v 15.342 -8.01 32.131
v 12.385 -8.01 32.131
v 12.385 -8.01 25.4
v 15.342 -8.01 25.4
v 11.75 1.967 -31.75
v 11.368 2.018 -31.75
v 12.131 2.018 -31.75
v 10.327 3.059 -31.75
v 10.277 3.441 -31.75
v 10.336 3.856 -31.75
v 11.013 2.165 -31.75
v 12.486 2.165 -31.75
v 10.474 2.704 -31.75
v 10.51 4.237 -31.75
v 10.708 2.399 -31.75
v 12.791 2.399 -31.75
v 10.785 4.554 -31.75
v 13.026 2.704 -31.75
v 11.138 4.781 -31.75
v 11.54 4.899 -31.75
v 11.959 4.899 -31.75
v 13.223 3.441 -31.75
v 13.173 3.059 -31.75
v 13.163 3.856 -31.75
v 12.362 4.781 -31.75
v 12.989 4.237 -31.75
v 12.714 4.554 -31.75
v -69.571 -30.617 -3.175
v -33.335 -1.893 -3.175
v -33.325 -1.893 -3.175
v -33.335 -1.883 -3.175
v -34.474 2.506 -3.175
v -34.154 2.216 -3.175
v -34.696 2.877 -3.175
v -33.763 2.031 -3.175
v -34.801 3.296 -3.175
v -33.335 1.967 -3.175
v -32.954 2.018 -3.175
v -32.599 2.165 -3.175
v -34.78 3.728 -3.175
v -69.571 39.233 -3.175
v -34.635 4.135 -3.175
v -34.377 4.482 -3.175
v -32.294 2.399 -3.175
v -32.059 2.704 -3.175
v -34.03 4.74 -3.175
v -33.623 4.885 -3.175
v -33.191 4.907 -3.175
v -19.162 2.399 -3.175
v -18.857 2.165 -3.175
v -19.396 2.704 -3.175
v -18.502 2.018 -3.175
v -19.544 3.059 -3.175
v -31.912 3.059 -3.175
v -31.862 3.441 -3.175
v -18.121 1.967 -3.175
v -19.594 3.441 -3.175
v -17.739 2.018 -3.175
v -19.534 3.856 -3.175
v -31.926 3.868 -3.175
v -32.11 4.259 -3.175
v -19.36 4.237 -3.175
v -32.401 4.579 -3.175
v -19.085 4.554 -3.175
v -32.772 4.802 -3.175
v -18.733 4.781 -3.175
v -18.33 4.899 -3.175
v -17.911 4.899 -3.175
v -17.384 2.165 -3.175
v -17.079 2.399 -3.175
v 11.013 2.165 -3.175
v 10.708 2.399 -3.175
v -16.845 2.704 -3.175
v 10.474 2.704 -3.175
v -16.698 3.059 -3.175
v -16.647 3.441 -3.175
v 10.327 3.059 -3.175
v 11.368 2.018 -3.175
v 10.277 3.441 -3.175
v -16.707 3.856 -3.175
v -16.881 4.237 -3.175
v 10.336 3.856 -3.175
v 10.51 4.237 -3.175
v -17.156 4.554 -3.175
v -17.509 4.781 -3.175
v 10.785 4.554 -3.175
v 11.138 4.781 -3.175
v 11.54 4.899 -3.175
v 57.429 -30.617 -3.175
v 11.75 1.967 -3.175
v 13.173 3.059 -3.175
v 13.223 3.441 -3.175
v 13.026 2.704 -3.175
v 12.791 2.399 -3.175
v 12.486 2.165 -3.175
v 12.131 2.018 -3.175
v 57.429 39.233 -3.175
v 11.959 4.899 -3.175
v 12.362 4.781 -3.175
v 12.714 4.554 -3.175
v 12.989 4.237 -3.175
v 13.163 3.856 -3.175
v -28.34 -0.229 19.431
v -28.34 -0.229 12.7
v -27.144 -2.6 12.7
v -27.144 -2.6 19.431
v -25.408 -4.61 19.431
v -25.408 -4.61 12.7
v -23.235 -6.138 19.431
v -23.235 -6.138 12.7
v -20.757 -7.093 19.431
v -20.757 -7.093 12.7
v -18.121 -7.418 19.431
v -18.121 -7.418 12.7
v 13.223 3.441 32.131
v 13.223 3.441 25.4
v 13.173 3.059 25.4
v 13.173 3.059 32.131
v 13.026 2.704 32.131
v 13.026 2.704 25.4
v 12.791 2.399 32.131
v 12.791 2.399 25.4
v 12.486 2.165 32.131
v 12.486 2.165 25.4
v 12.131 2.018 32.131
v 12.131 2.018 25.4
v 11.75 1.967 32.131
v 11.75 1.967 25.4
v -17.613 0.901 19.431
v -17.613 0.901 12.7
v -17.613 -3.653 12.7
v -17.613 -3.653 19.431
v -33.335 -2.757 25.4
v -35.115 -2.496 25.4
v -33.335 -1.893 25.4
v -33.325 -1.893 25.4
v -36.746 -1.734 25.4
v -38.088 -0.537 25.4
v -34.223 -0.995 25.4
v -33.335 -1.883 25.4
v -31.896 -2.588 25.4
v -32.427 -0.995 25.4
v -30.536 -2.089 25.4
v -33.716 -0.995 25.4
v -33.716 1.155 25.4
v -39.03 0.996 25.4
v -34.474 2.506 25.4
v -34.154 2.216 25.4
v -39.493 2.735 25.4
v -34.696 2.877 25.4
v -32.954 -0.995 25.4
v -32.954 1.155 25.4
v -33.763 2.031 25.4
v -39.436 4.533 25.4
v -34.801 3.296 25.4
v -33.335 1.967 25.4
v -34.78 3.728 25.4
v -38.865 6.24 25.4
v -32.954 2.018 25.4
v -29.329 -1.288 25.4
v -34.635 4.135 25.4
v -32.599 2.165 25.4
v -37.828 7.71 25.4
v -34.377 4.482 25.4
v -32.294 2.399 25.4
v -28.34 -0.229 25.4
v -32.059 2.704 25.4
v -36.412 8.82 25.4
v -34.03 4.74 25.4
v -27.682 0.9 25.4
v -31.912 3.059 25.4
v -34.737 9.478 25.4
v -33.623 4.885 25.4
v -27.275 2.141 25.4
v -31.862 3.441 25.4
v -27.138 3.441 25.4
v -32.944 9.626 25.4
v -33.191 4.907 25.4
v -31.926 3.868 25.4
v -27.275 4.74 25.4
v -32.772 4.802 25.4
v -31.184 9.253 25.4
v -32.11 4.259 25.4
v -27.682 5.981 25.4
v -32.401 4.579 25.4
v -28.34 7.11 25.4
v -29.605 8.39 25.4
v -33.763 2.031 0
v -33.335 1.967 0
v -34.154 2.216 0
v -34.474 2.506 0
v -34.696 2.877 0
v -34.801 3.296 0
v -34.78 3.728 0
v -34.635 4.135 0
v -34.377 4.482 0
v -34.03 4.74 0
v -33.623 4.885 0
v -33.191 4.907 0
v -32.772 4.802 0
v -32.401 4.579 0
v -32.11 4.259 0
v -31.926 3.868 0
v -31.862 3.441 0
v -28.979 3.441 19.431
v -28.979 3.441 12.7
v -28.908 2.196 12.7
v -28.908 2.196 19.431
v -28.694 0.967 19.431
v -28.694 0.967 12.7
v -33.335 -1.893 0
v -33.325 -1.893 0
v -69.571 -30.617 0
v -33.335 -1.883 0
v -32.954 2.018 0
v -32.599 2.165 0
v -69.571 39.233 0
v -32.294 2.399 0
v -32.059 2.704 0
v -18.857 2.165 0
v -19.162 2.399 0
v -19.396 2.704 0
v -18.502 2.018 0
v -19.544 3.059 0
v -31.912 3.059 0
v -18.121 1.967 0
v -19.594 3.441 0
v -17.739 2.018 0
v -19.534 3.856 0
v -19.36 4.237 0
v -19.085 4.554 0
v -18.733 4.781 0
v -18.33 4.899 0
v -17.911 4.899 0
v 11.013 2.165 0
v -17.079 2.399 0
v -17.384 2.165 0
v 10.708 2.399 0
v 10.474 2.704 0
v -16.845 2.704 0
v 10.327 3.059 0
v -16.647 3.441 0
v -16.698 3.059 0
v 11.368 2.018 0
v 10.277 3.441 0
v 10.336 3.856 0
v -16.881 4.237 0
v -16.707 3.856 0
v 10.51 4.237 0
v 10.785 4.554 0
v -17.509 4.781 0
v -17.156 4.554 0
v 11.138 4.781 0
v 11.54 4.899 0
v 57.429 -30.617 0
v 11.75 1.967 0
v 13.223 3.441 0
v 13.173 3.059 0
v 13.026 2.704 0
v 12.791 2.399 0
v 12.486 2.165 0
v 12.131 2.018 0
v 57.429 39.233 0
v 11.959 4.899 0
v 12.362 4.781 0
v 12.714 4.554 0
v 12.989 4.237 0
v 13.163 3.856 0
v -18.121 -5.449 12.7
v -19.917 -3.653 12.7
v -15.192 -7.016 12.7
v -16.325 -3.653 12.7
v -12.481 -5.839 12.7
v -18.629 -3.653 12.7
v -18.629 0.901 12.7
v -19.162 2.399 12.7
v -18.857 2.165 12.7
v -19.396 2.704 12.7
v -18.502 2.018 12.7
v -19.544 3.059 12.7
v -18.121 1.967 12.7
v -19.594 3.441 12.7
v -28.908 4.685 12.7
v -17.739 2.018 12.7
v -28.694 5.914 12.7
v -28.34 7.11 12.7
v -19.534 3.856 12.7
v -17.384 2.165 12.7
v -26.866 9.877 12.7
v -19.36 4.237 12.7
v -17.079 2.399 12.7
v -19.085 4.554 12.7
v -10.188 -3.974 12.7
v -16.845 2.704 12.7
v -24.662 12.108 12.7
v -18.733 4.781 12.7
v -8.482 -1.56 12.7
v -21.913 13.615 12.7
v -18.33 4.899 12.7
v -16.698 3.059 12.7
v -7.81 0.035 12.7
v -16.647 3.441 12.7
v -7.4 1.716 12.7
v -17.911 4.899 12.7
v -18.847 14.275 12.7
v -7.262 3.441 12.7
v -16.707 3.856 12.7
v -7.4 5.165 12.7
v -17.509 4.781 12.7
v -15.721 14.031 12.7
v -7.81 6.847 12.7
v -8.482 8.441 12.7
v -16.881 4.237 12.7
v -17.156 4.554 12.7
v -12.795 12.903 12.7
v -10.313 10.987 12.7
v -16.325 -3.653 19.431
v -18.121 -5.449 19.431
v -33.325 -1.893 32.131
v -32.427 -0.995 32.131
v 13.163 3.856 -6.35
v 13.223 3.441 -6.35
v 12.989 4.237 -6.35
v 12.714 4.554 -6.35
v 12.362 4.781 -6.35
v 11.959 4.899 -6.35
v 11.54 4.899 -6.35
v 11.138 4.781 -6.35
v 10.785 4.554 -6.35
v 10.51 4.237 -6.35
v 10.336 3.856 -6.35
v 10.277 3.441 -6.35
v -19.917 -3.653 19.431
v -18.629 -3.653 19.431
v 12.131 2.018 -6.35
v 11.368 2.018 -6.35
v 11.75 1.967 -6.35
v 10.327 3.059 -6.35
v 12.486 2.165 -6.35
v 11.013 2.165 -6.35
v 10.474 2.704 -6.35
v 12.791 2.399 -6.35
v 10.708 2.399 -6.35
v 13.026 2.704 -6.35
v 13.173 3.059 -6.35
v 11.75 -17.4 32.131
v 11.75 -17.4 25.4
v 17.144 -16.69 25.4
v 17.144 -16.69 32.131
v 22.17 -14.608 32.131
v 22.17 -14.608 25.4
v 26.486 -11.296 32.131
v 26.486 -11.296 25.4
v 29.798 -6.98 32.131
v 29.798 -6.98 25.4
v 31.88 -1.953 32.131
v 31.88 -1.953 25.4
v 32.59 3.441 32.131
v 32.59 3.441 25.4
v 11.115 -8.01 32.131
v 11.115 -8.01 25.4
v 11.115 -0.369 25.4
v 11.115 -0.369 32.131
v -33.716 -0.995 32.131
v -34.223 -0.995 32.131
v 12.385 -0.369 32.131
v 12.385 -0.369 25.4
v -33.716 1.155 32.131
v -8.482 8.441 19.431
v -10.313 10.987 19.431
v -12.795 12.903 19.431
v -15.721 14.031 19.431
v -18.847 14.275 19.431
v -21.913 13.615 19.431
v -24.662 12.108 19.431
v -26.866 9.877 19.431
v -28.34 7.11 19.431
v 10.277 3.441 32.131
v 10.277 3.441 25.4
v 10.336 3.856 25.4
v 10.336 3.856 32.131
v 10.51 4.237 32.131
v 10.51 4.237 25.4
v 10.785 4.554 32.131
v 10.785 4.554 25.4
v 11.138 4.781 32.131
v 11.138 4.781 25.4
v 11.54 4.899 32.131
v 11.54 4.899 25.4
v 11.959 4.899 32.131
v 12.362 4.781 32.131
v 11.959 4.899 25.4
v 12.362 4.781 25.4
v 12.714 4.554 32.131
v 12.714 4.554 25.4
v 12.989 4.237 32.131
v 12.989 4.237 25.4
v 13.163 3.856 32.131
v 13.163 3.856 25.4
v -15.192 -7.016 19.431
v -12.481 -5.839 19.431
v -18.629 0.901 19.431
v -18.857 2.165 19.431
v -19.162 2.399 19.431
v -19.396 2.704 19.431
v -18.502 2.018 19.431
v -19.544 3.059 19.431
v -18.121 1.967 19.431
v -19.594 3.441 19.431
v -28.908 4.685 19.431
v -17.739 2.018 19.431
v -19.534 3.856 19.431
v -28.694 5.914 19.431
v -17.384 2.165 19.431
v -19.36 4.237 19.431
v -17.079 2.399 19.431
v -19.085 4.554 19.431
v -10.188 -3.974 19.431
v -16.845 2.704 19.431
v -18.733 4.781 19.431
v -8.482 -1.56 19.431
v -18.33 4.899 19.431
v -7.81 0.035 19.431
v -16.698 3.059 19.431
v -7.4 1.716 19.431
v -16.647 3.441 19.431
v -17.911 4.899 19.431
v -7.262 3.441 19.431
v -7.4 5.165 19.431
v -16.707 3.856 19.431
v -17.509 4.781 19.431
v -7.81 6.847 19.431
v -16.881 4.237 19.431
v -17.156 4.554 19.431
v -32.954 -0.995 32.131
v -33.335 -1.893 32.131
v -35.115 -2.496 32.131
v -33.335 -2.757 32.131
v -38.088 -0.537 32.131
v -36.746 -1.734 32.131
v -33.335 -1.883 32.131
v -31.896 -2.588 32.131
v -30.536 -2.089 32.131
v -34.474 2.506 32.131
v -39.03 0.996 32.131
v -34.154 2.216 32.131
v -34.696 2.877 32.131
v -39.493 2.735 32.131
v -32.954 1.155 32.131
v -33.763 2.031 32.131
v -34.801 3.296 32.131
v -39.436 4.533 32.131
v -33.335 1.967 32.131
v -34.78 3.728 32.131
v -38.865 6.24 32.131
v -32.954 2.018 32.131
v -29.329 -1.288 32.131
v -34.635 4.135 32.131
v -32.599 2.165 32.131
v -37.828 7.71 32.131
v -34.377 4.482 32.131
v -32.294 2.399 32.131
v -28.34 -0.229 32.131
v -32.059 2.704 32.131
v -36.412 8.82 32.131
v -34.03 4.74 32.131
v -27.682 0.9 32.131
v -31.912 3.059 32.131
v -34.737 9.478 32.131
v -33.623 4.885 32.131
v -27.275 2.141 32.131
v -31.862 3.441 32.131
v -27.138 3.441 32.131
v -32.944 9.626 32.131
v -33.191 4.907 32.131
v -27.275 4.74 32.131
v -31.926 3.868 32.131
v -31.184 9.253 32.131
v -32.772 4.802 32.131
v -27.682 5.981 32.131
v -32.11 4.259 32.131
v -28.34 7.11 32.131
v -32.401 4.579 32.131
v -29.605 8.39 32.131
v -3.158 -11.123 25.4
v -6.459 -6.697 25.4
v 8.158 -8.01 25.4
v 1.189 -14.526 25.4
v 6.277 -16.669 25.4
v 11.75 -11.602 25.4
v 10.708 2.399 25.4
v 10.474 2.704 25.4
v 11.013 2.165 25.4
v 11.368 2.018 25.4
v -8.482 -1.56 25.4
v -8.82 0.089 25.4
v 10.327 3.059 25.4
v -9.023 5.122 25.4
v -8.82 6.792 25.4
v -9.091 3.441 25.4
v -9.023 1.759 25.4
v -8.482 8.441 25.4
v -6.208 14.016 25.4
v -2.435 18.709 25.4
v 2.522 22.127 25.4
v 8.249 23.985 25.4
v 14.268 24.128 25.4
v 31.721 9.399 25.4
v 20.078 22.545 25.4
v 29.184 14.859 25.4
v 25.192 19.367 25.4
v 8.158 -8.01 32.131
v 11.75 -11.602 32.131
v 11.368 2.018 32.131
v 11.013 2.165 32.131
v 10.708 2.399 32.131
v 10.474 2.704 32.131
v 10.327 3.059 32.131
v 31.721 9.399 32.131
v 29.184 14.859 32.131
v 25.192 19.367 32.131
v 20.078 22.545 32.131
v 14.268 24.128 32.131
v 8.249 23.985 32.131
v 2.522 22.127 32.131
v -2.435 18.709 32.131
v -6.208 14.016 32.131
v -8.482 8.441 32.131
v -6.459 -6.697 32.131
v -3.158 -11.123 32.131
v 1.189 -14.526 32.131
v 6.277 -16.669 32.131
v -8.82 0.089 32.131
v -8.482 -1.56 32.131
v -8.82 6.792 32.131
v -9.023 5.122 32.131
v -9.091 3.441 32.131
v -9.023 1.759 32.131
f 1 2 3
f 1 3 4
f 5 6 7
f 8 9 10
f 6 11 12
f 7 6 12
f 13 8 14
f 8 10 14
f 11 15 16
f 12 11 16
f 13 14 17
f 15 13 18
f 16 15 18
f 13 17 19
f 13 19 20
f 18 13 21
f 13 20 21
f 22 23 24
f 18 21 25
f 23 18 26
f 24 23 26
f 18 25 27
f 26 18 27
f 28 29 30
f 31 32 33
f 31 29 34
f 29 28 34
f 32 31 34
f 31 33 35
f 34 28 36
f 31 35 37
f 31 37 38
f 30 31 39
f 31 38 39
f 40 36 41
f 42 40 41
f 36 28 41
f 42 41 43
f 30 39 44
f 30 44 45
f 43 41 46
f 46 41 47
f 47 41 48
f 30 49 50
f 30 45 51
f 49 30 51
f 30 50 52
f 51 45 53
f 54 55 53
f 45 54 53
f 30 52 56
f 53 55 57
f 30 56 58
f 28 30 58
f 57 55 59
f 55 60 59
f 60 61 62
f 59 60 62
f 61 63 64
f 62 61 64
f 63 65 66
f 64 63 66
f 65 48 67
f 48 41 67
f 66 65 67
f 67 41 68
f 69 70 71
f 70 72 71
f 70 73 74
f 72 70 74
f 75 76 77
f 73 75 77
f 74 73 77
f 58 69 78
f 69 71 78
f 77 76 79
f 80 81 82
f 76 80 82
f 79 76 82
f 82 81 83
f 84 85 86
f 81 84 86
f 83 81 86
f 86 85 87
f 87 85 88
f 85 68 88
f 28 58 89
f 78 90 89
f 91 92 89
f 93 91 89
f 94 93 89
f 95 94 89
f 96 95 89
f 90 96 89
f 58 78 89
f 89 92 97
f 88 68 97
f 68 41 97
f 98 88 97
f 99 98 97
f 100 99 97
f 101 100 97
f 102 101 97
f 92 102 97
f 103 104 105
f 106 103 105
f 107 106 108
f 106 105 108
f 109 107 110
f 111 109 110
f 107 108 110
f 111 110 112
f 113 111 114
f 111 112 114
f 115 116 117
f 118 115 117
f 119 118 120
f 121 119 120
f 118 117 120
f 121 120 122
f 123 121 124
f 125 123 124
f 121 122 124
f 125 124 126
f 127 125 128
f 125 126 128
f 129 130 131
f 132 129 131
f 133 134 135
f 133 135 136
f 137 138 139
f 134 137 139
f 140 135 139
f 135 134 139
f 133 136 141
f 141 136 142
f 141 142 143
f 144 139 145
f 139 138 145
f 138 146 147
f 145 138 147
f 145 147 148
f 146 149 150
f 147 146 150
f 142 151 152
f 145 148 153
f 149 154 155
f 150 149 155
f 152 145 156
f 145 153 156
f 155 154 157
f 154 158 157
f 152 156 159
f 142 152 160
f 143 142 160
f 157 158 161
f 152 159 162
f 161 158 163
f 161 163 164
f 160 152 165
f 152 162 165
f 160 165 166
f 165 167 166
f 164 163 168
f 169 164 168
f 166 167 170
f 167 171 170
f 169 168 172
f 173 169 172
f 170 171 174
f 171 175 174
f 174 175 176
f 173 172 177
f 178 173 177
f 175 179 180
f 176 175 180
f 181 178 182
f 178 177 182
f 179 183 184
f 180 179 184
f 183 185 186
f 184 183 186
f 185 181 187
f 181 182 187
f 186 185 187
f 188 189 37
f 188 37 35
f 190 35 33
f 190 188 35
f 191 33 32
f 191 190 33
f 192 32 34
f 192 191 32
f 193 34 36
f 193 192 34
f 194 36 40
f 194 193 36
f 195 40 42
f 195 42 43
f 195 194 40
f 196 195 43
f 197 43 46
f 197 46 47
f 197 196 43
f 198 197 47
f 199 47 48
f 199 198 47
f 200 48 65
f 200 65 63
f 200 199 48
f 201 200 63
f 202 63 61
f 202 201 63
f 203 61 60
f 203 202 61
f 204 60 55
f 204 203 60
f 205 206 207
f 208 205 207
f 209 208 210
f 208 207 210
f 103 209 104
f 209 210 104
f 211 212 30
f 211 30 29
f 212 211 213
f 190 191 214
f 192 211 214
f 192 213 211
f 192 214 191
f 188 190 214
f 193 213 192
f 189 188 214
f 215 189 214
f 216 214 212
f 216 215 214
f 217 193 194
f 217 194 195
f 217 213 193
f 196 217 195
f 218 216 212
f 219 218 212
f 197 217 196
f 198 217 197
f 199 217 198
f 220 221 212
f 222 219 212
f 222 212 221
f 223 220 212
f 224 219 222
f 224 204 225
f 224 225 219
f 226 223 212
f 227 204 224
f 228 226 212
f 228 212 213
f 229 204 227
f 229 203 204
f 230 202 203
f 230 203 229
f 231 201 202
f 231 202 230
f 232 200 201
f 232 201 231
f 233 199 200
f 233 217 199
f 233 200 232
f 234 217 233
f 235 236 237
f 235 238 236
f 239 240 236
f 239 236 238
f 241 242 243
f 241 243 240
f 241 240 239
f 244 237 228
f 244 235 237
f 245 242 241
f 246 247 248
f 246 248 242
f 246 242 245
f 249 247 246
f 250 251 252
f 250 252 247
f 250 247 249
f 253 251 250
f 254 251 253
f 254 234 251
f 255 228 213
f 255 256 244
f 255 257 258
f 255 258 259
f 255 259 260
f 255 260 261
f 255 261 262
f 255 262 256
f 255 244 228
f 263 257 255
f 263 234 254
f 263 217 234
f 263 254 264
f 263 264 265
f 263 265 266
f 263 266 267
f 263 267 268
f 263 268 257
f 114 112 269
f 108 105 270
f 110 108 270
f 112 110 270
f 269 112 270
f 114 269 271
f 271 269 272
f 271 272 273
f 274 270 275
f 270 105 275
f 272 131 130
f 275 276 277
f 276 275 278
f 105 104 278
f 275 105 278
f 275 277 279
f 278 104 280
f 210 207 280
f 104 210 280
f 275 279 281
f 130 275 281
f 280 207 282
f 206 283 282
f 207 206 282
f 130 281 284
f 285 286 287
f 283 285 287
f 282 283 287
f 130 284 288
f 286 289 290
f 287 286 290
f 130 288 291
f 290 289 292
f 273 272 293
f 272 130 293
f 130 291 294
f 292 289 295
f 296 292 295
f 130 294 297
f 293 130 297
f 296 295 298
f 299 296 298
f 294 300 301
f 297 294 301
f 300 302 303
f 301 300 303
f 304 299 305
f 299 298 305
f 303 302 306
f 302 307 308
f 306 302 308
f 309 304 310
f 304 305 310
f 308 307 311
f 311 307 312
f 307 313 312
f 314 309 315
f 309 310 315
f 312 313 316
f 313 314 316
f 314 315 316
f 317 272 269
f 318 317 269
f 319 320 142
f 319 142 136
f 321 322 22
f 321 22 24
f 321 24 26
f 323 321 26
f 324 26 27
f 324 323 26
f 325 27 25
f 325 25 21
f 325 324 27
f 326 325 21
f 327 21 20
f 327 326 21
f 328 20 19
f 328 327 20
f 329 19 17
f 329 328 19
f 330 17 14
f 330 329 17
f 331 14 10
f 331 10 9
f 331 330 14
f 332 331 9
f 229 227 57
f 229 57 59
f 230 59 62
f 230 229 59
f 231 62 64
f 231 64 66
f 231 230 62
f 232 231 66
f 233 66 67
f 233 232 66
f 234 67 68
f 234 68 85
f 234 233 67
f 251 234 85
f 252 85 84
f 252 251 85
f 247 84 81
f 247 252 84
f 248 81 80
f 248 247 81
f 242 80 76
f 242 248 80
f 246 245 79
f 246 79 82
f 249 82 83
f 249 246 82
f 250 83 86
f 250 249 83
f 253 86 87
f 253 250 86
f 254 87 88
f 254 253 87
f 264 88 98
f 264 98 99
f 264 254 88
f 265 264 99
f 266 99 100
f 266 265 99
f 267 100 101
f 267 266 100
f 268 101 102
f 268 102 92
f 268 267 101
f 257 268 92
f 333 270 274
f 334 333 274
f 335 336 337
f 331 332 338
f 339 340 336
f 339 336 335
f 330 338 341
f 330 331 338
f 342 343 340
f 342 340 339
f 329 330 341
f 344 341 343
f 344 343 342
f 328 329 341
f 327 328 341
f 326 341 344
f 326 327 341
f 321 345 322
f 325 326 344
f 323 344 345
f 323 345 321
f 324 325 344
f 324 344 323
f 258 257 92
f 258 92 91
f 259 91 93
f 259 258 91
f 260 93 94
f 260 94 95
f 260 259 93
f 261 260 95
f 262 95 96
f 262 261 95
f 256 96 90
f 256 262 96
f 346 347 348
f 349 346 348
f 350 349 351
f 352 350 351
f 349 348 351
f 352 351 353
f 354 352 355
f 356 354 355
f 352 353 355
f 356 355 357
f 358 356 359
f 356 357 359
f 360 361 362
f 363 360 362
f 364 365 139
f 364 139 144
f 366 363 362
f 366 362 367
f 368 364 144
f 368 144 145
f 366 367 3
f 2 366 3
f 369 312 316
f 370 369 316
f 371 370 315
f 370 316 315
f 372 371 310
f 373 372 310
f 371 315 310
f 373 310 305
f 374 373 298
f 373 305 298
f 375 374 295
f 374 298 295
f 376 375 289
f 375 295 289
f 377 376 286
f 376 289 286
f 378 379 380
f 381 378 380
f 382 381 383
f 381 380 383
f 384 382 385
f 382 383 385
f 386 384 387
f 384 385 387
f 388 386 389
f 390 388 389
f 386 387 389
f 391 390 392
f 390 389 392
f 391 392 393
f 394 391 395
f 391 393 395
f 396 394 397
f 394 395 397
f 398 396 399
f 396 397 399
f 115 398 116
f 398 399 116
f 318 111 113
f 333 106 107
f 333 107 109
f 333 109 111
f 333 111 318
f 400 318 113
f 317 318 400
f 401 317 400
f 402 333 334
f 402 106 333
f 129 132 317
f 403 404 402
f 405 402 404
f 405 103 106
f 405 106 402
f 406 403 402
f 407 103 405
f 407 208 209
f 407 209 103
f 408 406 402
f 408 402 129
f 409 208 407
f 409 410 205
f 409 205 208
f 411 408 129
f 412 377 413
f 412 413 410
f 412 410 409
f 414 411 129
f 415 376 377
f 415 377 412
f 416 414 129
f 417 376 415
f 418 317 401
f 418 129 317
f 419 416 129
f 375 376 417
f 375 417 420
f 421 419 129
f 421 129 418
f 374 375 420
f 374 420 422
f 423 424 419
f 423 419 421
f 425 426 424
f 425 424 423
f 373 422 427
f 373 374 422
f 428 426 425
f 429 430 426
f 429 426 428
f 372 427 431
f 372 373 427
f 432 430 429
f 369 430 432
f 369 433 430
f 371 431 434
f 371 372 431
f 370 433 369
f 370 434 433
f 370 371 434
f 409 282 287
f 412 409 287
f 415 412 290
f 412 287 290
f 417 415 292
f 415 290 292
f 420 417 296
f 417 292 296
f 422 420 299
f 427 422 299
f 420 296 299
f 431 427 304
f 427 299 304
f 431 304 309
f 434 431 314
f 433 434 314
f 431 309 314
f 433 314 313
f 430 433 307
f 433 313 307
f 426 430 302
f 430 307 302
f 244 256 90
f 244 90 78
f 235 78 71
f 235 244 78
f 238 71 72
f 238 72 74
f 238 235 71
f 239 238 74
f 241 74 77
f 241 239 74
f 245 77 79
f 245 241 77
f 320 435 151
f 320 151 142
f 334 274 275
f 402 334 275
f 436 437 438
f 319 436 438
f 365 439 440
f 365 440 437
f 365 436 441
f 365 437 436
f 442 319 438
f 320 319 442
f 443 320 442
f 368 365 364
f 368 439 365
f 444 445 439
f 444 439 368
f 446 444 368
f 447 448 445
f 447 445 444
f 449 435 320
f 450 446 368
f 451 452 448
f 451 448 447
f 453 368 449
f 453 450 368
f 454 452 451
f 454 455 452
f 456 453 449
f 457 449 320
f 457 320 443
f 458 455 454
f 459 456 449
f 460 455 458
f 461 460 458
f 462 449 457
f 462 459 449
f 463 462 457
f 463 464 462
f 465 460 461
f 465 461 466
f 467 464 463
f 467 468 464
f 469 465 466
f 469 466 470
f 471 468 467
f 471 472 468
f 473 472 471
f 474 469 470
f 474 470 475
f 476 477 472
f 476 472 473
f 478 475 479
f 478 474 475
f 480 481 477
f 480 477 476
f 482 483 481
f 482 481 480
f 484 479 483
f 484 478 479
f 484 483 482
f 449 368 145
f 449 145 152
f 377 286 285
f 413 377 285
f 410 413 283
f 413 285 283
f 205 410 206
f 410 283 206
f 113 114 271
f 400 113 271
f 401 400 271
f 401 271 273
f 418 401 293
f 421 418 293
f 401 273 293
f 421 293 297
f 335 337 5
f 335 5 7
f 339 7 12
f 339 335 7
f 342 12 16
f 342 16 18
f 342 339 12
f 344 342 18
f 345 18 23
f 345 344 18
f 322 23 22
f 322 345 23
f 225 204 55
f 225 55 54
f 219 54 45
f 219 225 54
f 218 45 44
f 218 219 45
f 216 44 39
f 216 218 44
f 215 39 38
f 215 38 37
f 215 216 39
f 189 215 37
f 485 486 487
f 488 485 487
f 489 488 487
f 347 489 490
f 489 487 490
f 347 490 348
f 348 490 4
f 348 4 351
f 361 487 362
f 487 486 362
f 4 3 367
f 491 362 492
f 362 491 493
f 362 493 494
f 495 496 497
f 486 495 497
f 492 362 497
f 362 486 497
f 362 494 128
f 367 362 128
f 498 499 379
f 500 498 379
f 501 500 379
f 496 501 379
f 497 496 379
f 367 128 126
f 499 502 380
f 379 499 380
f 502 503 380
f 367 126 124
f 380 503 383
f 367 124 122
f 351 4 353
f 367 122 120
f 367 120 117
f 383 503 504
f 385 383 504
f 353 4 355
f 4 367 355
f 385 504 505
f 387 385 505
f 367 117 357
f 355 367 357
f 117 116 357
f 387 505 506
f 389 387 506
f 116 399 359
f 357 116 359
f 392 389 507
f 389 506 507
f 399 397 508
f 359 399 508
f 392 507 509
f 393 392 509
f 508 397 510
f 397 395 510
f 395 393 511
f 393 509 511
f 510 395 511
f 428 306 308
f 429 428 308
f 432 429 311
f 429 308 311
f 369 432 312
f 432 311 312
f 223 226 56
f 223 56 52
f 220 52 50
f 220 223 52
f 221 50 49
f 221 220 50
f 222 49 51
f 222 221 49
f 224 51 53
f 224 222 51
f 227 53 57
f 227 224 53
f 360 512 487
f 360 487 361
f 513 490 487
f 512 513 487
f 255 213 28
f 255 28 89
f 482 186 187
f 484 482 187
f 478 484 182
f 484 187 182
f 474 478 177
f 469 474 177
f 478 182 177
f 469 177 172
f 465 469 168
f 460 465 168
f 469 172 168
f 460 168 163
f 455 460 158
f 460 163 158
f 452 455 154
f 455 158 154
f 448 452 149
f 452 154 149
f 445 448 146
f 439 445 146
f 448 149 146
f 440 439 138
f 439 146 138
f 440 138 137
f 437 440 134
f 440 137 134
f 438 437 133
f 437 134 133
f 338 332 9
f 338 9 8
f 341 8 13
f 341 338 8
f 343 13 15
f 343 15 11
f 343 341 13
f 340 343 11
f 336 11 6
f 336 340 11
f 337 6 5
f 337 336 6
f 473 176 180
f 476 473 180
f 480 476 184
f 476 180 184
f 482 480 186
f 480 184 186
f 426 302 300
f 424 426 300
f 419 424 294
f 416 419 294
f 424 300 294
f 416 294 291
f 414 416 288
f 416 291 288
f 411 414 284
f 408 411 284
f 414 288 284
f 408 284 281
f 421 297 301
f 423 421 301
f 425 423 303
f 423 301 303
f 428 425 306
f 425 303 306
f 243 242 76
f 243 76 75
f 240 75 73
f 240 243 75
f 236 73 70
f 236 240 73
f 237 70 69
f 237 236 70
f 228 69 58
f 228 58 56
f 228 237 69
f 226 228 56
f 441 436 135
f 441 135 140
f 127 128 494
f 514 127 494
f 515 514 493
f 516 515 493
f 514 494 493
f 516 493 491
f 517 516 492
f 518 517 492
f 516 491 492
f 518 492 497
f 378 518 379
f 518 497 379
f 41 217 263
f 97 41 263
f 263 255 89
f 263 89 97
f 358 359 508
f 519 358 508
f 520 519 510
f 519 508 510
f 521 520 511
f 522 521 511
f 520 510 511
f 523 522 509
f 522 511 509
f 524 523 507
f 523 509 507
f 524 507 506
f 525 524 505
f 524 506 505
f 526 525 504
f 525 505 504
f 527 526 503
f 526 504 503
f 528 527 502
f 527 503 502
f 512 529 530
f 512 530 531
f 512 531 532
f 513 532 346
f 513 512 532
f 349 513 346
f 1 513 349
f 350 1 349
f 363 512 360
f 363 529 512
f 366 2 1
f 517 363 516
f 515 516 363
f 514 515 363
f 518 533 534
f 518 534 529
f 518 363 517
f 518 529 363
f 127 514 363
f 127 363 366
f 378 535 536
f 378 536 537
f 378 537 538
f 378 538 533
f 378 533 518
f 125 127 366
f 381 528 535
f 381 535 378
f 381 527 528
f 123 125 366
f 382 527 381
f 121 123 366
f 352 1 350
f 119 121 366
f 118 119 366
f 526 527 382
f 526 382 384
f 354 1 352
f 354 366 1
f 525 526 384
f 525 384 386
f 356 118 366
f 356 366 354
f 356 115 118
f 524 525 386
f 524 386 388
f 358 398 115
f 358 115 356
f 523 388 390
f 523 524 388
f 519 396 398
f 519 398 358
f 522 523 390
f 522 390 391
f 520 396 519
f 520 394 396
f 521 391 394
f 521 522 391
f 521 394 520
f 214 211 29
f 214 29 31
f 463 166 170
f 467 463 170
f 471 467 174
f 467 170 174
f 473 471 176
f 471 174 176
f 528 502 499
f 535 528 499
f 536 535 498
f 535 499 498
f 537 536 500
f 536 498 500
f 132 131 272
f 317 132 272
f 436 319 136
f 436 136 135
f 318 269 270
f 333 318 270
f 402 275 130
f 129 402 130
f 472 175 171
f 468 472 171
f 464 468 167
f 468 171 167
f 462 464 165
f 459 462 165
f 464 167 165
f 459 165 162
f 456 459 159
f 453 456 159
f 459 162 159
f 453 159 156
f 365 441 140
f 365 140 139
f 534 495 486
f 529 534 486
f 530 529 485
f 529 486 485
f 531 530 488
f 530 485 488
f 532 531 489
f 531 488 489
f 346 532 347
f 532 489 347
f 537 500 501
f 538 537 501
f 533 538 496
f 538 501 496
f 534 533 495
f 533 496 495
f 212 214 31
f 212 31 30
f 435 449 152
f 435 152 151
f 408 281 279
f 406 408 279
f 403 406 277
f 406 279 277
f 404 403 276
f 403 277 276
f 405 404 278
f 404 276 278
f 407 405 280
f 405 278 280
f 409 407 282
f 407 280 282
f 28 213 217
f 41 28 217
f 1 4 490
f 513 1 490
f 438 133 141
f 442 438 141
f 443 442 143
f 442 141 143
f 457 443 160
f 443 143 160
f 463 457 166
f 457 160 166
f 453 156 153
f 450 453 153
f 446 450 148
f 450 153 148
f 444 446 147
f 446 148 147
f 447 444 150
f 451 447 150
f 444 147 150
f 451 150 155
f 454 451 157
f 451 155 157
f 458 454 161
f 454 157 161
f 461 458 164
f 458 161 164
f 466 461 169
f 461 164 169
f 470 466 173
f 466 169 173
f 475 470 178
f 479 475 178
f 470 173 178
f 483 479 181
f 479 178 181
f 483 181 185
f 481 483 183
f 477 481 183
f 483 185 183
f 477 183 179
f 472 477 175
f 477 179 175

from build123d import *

# Parameters (mm, degrees)
F0_W     = 127
F0_H     = 69.85
F0_W_2   = 0.381
F0_H_2   = 2.1499743879
F0_W_3   = 0.508
F0_H_3   = 4.5539487758
F0_W_4   = 0.635
F0_H_4   = 7.6400852611
F1_DEPTH = 3.175
F2_START = 25.4
F2_DEPTH = 6.731
F3_START = 25.4
F3_DEPTH = 6.731
F4_START = 12.7
F4_DEPTH = 6.731
F5_START = -6.35
F5_DEPTH = 25.4


with BuildPart() as f1:
    # F0 (on Top) → F1 (new body)
    with BuildSketch(Plane.XY):
        with Locations((-6.0705711842, 4.3084023254)):
            Rectangle(F0_W, F0_H)
        with BuildLine():
            ThreePointArc((-33.3352696088, -2.7570773477), (-38.8647330515, 6.2396796318), (-28.3404857607, 7.1096342711))
            ThreePointArc((-28.3404857607, 7.1096342711), (-18.8470887176, 14.2746971722), (-8.4821471598, 8.4411133425))
            ThreePointArc((-8.4821471598, 8.4411133425), (14.2684886182, 24.1284571428), (32.5904303912, 3.4405226523))
            ThreePointArc((32.5904303912, 3.4405226523), (26.4863306859, -11.2960776424), (11.7497303912, -17.4001773477))
            ThreePointArc((11.7497303912, -17.4001773477), (-1.0978173533, -12.9690871372), (-8.4821471598, -1.5600680379))
            ThreePointArc((-8.4821471598, -1.5600680379), (-12.4811612862, -5.8386458519), (-18.1206696088, -7.4179773477))
            ThreePointArc((-18.1206696088, -7.4179773477), (-24.3683081122, -5.4405828747), (-28.3404857607, -0.2285889665))
            ThreePointArc((-28.3404857607, -0.2285889665), (-30.5361126293, -2.0889407904), (-33.3352696088, -2.7570773477))
        make_face(mode=Mode.SUBTRACT)
        with BuildLine():
            Line((10.2765303912, 3.4405226523), (-7.2621696088, 3.4405226523))
            ThreePointArc((-7.2621696088, 3.4405226523), (-7.5715720582, 0.8668942566), (-8.4821471598, -1.5600680379))
            ThreePointArc((-8.4821471598, -1.5600680379), (-1.0978173533, -12.9690871372), (11.7497303912, -17.4001773477))
            Line((11.7497303912, -17.4001773477), (11.7497303912, -11.6016650572))
            Line((11.7497303912, -11.6016650572), (11.1147303912, -11.6016650572))
            Line((11.1147303912, -11.6016650572), (11.1147303912, -10.9666650572))
            Line((11.1147303912, -10.9666650572), (8.1576279428, -8.0095626088))
            Line((8.1576279428, -8.0095626088), (11.1147303912, -8.0095626088))
            Line((11.1147303912, -8.0095626088), (11.1147303912, -0.3694773477))
            Line((11.1147303912, -0.3694773477), (11.7497303912, -0.3694773477))
            Line((11.7497303912, -0.3694773477), (11.7497303912, 1.9673226523))
            ThreePointArc((11.7497303912, 1.9673226523), (10.7080206812, 2.3988129423), (10.2765303912, 3.4405226523))
        make_face()
        with BuildLine():
            ThreePointArc((32.5904303912, 3.4405226523), (14.2684886182, 24.1284571428), (-8.4821471598, 8.4411133425))
            ThreePointArc((-8.4821471598, 8.4411133425), (-7.5715720582, 6.0141510479), (-7.2621696088, 3.4405226523))
            Line((-7.2621696088, 3.4405226523), (10.2765303912, 3.4405226523))
            ThreePointArc((10.2765303912, 3.4405226523), (11.7497303912, 4.9137226523), (13.2229303912, 3.4405226523))
            ThreePointArc((13.2229303912, 3.4405226523), (12.7914401012, 2.3988129423), (11.7497303912, 1.9673226523))
            Line((11.7497303912, 1.9673226523), (11.7497303912, -0.3694773477))
            Line((11.7497303912, -0.3694773477), (12.3847303912, -0.3694773477))
            Line((12.3847303912, -0.3694773477), (12.3847303912, -8.0095626088))
            Line((12.3847303912, -8.0095626088), (15.3418328396, -8.0095626088))
            Line((15.3418328396, -8.0095626088), (12.3847303912, -10.9666650572))
            Line((12.3847303912, -10.9666650572), (12.3847303912, -11.6016650572))
            Line((12.3847303912, -11.6016650572), (11.7497303912, -11.6016650572))
            Line((11.7497303912, -11.6016650572), (11.7497303912, -17.4001773477))
            ThreePointArc((11.7497303912, -17.4001773477), (26.4863306859, -11.2960776424), (32.5904303912, 3.4405226523))
        make_face()
        with BuildLine():
            ThreePointArc((-28.3404857607, 7.1096342711), (-27.4460456303, 5.3711408672), (-27.1376696088, 3.4405226523))
            Line((-27.1376696088, 3.4405226523), (-19.5938696088, 3.4405226523))
            ThreePointArc((-19.5938696088, 3.4405226523), (-18.1206696088, 4.9137226523), (-16.6474696088, 3.4405226523))
            Line((-16.6474696088, 3.4405226523), (-9.0909696088, 3.4405226523))
            ThreePointArc((-9.0909696088, 3.4405226523), (-8.9382040993, 5.9592808793), (-8.4821471598, 8.4411133425))
            ThreePointArc((-8.4821471598, 8.4411133425), (-18.8470887176, 14.2746971722), (-28.3404857607, 7.1096342711))
        make_face()
        with BuildLine():
            ThreePointArc((-33.3352696088, 1.9673226523), (-34.3769793188, 4.4822323623), (-31.8620696088, 3.4405226523))
            Line((-31.8620696088, 3.4405226523), (-28.9791696088, 3.4405226523))
            ThreePointArc((-28.9791696088, 3.4405226523), (-28.8183071035, 5.3026650427), (-28.3404857607, 7.1096342711))
            ThreePointArc((-28.3404857607, 7.1096342711), (-38.8647330515, 6.2396796318), (-33.3352696088, -2.7570773477))
            Line((-33.3352696088, -2.7570773477), (-33.3352696088, -1.8934773477))
            Line((-33.3352696088, -1.8934773477), (-33.3352696088, -1.8828803738))
            Line((-33.3352696088, -1.8828803738), (-34.222698247, -0.9954517356))
            Line((-34.222698247, -0.9954517356), (-33.7162696088, -0.9954517356))
            Line((-33.7162696088, -0.9954517356), (-33.7162696088, 1.1545226523))
            Line((-33.7162696088, 1.1545226523), (-33.3352696088, 1.1545226523))
            Line((-33.3352696088, 1.1545226523), (-33.3352696088, 1.9673226523))
        make_face()
        with BuildLine():
            Line((-28.9791696088, 3.4405226523), (-31.8620696088, 3.4405226523))
            ThreePointArc((-31.8620696088, 3.4405226523), (-32.2935598988, 2.3988129423), (-33.3352696088, 1.9673226523))
            Line((-33.3352696088, 1.9673226523), (-33.3352696088, 1.1545226523))
            Line((-33.3352696088, 1.1545226523), (-32.9542696088, 1.1545226523))
            Line((-32.9542696088, 1.1545226523), (-32.9542696088, -0.9954517356))
            Line((-32.9542696088, -0.9954517356), (-32.4266470228, -0.9954517356))
            Line((-32.4266470228, -0.9954517356), (-32.9542696088, -1.5230743216))
            Line((-32.9542696088, -1.5230743216), (-32.9542696088, -1.8934773477))
            Line((-32.9542696088, -1.8934773477), (-33.3246726349, -1.8934773477))
            Line((-33.3246726349, -1.8934773477), (-33.3352696088, -1.8934773477))
            Line((-33.3352696088, -1.8934773477), (-33.3352696088, -2.7570773477))
            ThreePointArc((-33.3352696088, -2.7570773477), (-30.5361126293, -2.0889407904), (-28.3404857607, -0.2285889665))
            ThreePointArc((-28.3404857607, -0.2285889665), (-28.8183071035, 1.5783802619), (-28.9791696088, 3.4405226523))
        make_face()
        with BuildLine():
            Line((-27.1376696088, 3.4405226523), (-28.9791696088, 3.4405226523))
            ThreePointArc((-28.9791696088, 3.4405226523), (-28.8183071035, 1.5783802619), (-28.3404857607, -0.2285889665))
            ThreePointArc((-28.3404857607, -0.2285889665), (-27.4460456303, 1.5099044374), (-27.1376696088, 3.4405226523))
        make_face()
        with BuildLine():
            ThreePointArc((-28.3404857607, 7.1096342711), (-28.8183071035, 5.3026650427), (-28.9791696088, 3.4405226523))
            Line((-28.9791696088, 3.4405226523), (-27.1376696088, 3.4405226523))
            ThreePointArc((-27.1376696088, 3.4405226523), (-27.4460456303, 5.3711408672), (-28.3404857607, 7.1096342711))
        make_face()
        with BuildLine():
            Line((-7.2621696088, 3.4405226523), (-9.0909696088, 3.4405226523))
            ThreePointArc((-9.0909696088, 3.4405226523), (-8.9382040993, 0.9217644253), (-8.4821471598, -1.5600680379))
            ThreePointArc((-8.4821471598, -1.5600680379), (-7.5715720582, 0.8668942566), (-7.2621696088, 3.4405226523))
        make_face()
        with BuildLine():
            ThreePointArc((-7.2621696088, 3.4405226523), (-7.5715720582, 6.0141510479), (-8.4821471598, 8.4411133425))
            ThreePointArc((-8.4821471598, 8.4411133425), (-8.9382040993, 5.9592808793), (-9.0909696088, 3.4405226523))
            Line((-9.0909696088, 3.4405226523), (-7.2621696088, 3.4405226523))
        make_face()
        with Locations((-33.5257696088, 0.0795354583)):
            Rectangle(F0_W_2, F0_H_2)
        Polygon((-33.3352696088, -1.8828803738), (-33.3352696088, -0.9954517356), (-33.7162696088, -0.9954517356), (-34.222698247, -0.9954517356), align=None)
        with Locations((-33.1447696088, 0.0795354583)):
            Rectangle(F0_W_2, F0_H_2)
        Polygon((-32.9542696088, -0.9954517356), (-33.3352696088, -0.9954517356), (-33.3352696088, -1.8828803738), (-33.3246726349, -1.8934773477), (-32.9542696088, -1.5230743216), align=None)
        Polygon((-32.4266470228, -0.9954517356), (-32.9542696088, -0.9954517356), (-32.9542696088, -1.5230743216), align=None)
        Polygon((-32.9542696088, -1.5230743216), (-33.3246726349, -1.8934773477), (-32.9542696088, -1.8934773477), align=None)
        with BuildLine():
            Line((-18.1206696088, -5.4494773477), (-18.1206696088, -7.4179773477))
            ThreePointArc((-18.1206696088, -7.4179773477), (-12.4811612862, -5.8386458519), (-8.4821471598, -1.5600680379))
            ThreePointArc((-8.4821471598, -1.5600680379), (-8.9382040993, 0.9217644253), (-9.0909696088, 3.4405226523))
            Line((-9.0909696088, 3.4405226523), (-16.6474696088, 3.4405226523))
            ThreePointArc((-16.6474696088, 3.4405226523), (-17.0789598988, 2.3988129423), (-18.1206696088, 1.9673226523))
            Line((-18.1206696088, 1.9673226523), (-18.1206696088, 0.9005226523))
            Line((-18.1206696088, 0.9005226523), (-17.6126696088, 0.9005226523))
            Line((-17.6126696088, 0.9005226523), (-17.6126696088, -3.6534261235))
            Line((-17.6126696088, -3.6534261235), (-16.3246183846, -3.6534261235))
            Line((-16.3246183846, -3.6534261235), (-17.6126696088, -4.9414773477))
            Line((-17.6126696088, -4.9414773477), (-17.6126696088, -5.4494773477))
            Line((-17.6126696088, -5.4494773477), (-18.1206696088, -5.4494773477))
        make_face()
        with Locations((-18.3746696088, -1.3764517356)):
            Rectangle(F0_W_3, F0_H_3)
        with Locations((-17.8666696088, -1.3764517356)):
            Rectangle(F0_W_3, F0_H_3)
        Polygon((-19.916720833, -3.6534261235), (-18.6286696088, -4.9414773477), (-18.6286696088, -3.6534261235), align=None)
        Polygon((-18.6286696088, -4.9414773477), (-18.1206696088, -5.4494773477), (-18.1206696088, -3.6534261235), (-18.6286696088, -3.6534261235), align=None)
        Polygon((-18.1206696088, -3.6534261235), (-18.1206696088, -5.4494773477), (-17.6126696088, -4.9414773477), (-17.6126696088, -3.6534261235), align=None)
        Polygon((-17.6126696088, -3.6534261235), (-17.6126696088, -4.9414773477), (-16.3246183846, -3.6534261235), align=None)
        Polygon((-17.6126696088, -4.9414773477), (-18.1206696088, -5.4494773477), (-17.6126696088, -5.4494773477), align=None)
        Polygon((-18.6286696088, -5.4494773477), (-18.1206696088, -5.4494773477), (-18.6286696088, -4.9414773477), align=None)
        with BuildLine():
            Line((-19.5938696088, 3.4405226523), (-27.1376696088, 3.4405226523))
            ThreePointArc((-27.1376696088, 3.4405226523), (-27.4460456303, 1.5099044374), (-28.3404857607, -0.2285889665))
            ThreePointArc((-28.3404857607, -0.2285889665), (-24.3683081122, -5.4405828747), (-18.1206696088, -7.4179773477))
            Line((-18.1206696088, -7.4179773477), (-18.1206696088, -5.4494773477))
            Line((-18.1206696088, -5.4494773477), (-18.6286696088, -5.4494773477))
            Line((-18.6286696088, -5.4494773477), (-18.6286696088, -4.9414773477))
            Line((-18.6286696088, -4.9414773477), (-19.916720833, -3.6534261235))
            Line((-19.916720833, -3.6534261235), (-18.6286696088, -3.6534261235))
            Line((-18.6286696088, -3.6534261235), (-18.6286696088, 0.9005226523))
            Line((-18.6286696088, 0.9005226523), (-18.1206696088, 0.9005226523))
            Line((-18.1206696088, 0.9005226523), (-18.1206696088, 1.9673226523))
            ThreePointArc((-18.1206696088, 1.9673226523), (-19.1623793188, 2.3988129423), (-19.5938696088, 3.4405226523))
        make_face()
        Polygon((11.7497303912, -8.0095626088), (11.7497303912, -11.6016650572), (12.3847303912, -10.9666650572), (12.3847303912, -8.0095626088), align=None)
        Polygon((12.3847303912, -8.0095626088), (12.3847303912, -10.9666650572), (15.3418328396, -8.0095626088), align=None)
        Polygon((11.1147303912, -10.9666650572), (11.7497303912, -11.6016650572), (11.7497303912, -8.0095626088), (11.1147303912, -8.0095626088), align=None)
        Polygon((8.1576279428, -8.0095626088), (11.1147303912, -10.9666650572), (11.1147303912, -8.0095626088), align=None)
        with Locations((12.0672303912, -4.1895199783)):
            Rectangle(F0_W_4, F0_H_4)
        with Locations((11.4322303912, -4.1895199783)):
            Rectangle(F0_W_4, F0_H_4)
        Polygon((12.3847303912, -10.9666650572), (11.7497303912, -11.6016650572), (12.3847303912, -11.6016650572), align=None)
        Polygon((11.1147303912, -11.6016650572), (11.7497303912, -11.6016650572), (11.1147303912, -10.9666650572), align=None)
    extrude(amount=-F1_DEPTH)


with BuildPart() as f2:
    # F0 (on Top) → F2 (new body)
    with BuildSketch(Plane.XY.offset(F2_START)):
        with BuildLine():
            Line((10.2765303912, 3.4405226523), (-7.2621696088, 3.4405226523))
            ThreePointArc((-7.2621696088, 3.4405226523), (-7.5715720582, 0.8668942566), (-8.4821471598, -1.5600680379))
            ThreePointArc((-8.4821471598, -1.5600680379), (-1.0978173533, -12.9690871372), (11.7497303912, -17.4001773477))
            Line((11.7497303912, -17.4001773477), (11.7497303912, -11.6016650572))
            Line((11.7497303912, -11.6016650572), (11.1147303912, -11.6016650572))
            Line((11.1147303912, -11.6016650572), (11.1147303912, -10.9666650572))
            Line((11.1147303912, -10.9666650572), (8.1576279428, -8.0095626088))
            Line((8.1576279428, -8.0095626088), (11.1147303912, -8.0095626088))
            Line((11.1147303912, -8.0095626088), (11.1147303912, -0.3694773477))
            Line((11.1147303912, -0.3694773477), (11.7497303912, -0.3694773477))
            Line((11.7497303912, -0.3694773477), (11.7497303912, 1.9673226523))
            ThreePointArc((11.7497303912, 1.9673226523), (10.7080206812, 2.3988129423), (10.2765303912, 3.4405226523))
        make_face()
        with BuildLine():
            Line((-7.2621696088, 3.4405226523), (-9.0909696088, 3.4405226523))
            ThreePointArc((-9.0909696088, 3.4405226523), (-8.9382040993, 0.9217644253), (-8.4821471598, -1.5600680379))
            ThreePointArc((-8.4821471598, -1.5600680379), (-7.5715720582, 0.8668942566), (-7.2621696088, 3.4405226523))
        make_face()
        with BuildLine():
            ThreePointArc((-7.2621696088, 3.4405226523), (-7.5715720582, 6.0141510479), (-8.4821471598, 8.4411133425))
            ThreePointArc((-8.4821471598, 8.4411133425), (-8.9382040993, 5.9592808793), (-9.0909696088, 3.4405226523))
            Line((-9.0909696088, 3.4405226523), (-7.2621696088, 3.4405226523))
        make_face()
        Polygon((12.3847303912, -10.9666650572), (11.7497303912, -11.6016650572), (12.3847303912, -11.6016650572), align=None)
        Polygon((11.1147303912, -11.6016650572), (11.7497303912, -11.6016650572), (11.1147303912, -10.9666650572), align=None)
        with BuildLine():
            ThreePointArc((32.5904303912, 3.4405226523), (14.2684886182, 24.1284571428), (-8.4821471598, 8.4411133425))
            ThreePointArc((-8.4821471598, 8.4411133425), (-7.5715720582, 6.0141510479), (-7.2621696088, 3.4405226523))
            Line((-7.2621696088, 3.4405226523), (10.2765303912, 3.4405226523))
            ThreePointArc((10.2765303912, 3.4405226523), (11.7497303912, 4.9137226523), (13.2229303912, 3.4405226523))
            ThreePointArc((13.2229303912, 3.4405226523), (12.7914401012, 2.3988129423), (11.7497303912, 1.9673226523))
            Line((11.7497303912, 1.9673226523), (11.7497303912, -0.3694773477))
            Line((11.7497303912, -0.3694773477), (12.3847303912, -0.3694773477))
            Line((12.3847303912, -0.3694773477), (12.3847303912, -8.0095626088))
            Line((12.3847303912, -8.0095626088), (15.3418328396, -8.0095626088))
            Line((15.3418328396, -8.0095626088), (12.3847303912, -10.9666650572))
            Line((12.3847303912, -10.9666650572), (12.3847303912, -11.6016650572))
            Line((12.3847303912, -11.6016650572), (11.7497303912, -11.6016650572))
            Line((11.7497303912, -11.6016650572), (11.7497303912, -17.4001773477))
            ThreePointArc((11.7497303912, -17.4001773477), (26.4863306859, -11.2960776424), (32.5904303912, 3.4405226523))
        make_face()
    extrude(amount=F2_DEPTH)


with BuildPart() as f3:
    # F0 (on Top) → F3 (new body)
    with BuildSketch(Plane.XY.offset(F3_START)):
        with BuildLine():
            ThreePointArc((-28.3404857607, 7.1096342711), (-28.8183071035, 5.3026650427), (-28.9791696088, 3.4405226523))
            Line((-28.9791696088, 3.4405226523), (-27.1376696088, 3.4405226523))
            ThreePointArc((-27.1376696088, 3.4405226523), (-27.4460456303, 5.3711408672), (-28.3404857607, 7.1096342711))
        make_face()
        with BuildLine():
            Line((-27.1376696088, 3.4405226523), (-28.9791696088, 3.4405226523))
            ThreePointArc((-28.9791696088, 3.4405226523), (-28.8183071035, 1.5783802619), (-28.3404857607, -0.2285889665))
            ThreePointArc((-28.3404857607, -0.2285889665), (-27.4460456303, 1.5099044374), (-27.1376696088, 3.4405226523))
        make_face()
        with BuildLine():
            ThreePointArc((-33.3352696088, 1.9673226523), (-34.3769793188, 4.4822323623), (-31.8620696088, 3.4405226523))
            Line((-31.8620696088, 3.4405226523), (-28.9791696088, 3.4405226523))
            ThreePointArc((-28.9791696088, 3.4405226523), (-28.8183071035, 5.3026650427), (-28.3404857607, 7.1096342711))
            ThreePointArc((-28.3404857607, 7.1096342711), (-38.8647330515, 6.2396796318), (-33.3352696088, -2.7570773477))
            Line((-33.3352696088, -2.7570773477), (-33.3352696088, -1.8934773477))
            Line((-33.3352696088, -1.8934773477), (-33.3352696088, -1.8828803738))
            Line((-33.3352696088, -1.8828803738), (-34.222698247, -0.9954517356))
            Line((-34.222698247, -0.9954517356), (-33.7162696088, -0.9954517356))
            Line((-33.7162696088, -0.9954517356), (-33.7162696088, 1.1545226523))
            Line((-33.7162696088, 1.1545226523), (-33.3352696088, 1.1545226523))
            Line((-33.3352696088, 1.1545226523), (-33.3352696088, 1.9673226523))
        make_face()
        Polygon((-32.9542696088, -1.5230743216), (-33.3246726349, -1.8934773477), (-32.9542696088, -1.8934773477), align=None)
        with BuildLine():
            Line((-28.9791696088, 3.4405226523), (-31.8620696088, 3.4405226523))
            ThreePointArc((-31.8620696088, 3.4405226523), (-32.2935598988, 2.3988129423), (-33.3352696088, 1.9673226523))
            Line((-33.3352696088, 1.9673226523), (-33.3352696088, 1.1545226523))
            Line((-33.3352696088, 1.1545226523), (-32.9542696088, 1.1545226523))
            Line((-32.9542696088, 1.1545226523), (-32.9542696088, -0.9954517356))
            Line((-32.9542696088, -0.9954517356), (-32.4266470228, -0.9954517356))
            Line((-32.4266470228, -0.9954517356), (-32.9542696088, -1.5230743216))
            Line((-32.9542696088, -1.5230743216), (-32.9542696088, -1.8934773477))
            Line((-32.9542696088, -1.8934773477), (-33.3246726349, -1.8934773477))
            Line((-33.3246726349, -1.8934773477), (-33.3352696088, -1.8934773477))
            Line((-33.3352696088, -1.8934773477), (-33.3352696088, -2.7570773477))
            ThreePointArc((-33.3352696088, -2.7570773477), (-30.5361126293, -2.0889407904), (-28.3404857607, -0.2285889665))
            ThreePointArc((-28.3404857607, -0.2285889665), (-28.8183071035, 1.5783802619), (-28.9791696088, 3.4405226523))
        make_face()
    extrude(amount=F3_DEPTH)


with BuildPart() as f4:
    # F0 (on Top) → F4 (new body)
    with BuildSketch(Plane.XY.offset(F4_START)):
        with BuildLine():
            ThreePointArc((-7.2621696088, 3.4405226523), (-7.5715720582, 6.0141510479), (-8.4821471598, 8.4411133425))
            ThreePointArc((-8.4821471598, 8.4411133425), (-8.9382040993, 5.9592808793), (-9.0909696088, 3.4405226523))
            Line((-9.0909696088, 3.4405226523), (-7.2621696088, 3.4405226523))
        make_face()
        with BuildLine():
            Line((-7.2621696088, 3.4405226523), (-9.0909696088, 3.4405226523))
            ThreePointArc((-9.0909696088, 3.4405226523), (-8.9382040993, 0.9217644253), (-8.4821471598, -1.5600680379))
            ThreePointArc((-8.4821471598, -1.5600680379), (-7.5715720582, 0.8668942566), (-7.2621696088, 3.4405226523))
        make_face()
        with BuildLine():
            ThreePointArc((-28.3404857607, 7.1096342711), (-27.4460456303, 5.3711408672), (-27.1376696088, 3.4405226523))
            Line((-27.1376696088, 3.4405226523), (-19.5938696088, 3.4405226523))
            ThreePointArc((-19.5938696088, 3.4405226523), (-18.1206696088, 4.9137226523), (-16.6474696088, 3.4405226523))
            Line((-16.6474696088, 3.4405226523), (-9.0909696088, 3.4405226523))
            ThreePointArc((-9.0909696088, 3.4405226523), (-8.9382040993, 5.9592808793), (-8.4821471598, 8.4411133425))
            ThreePointArc((-8.4821471598, 8.4411133425), (-18.8470887176, 14.2746971722), (-28.3404857607, 7.1096342711))
        make_face()
        with BuildLine():
            Line((-19.5938696088, 3.4405226523), (-27.1376696088, 3.4405226523))
            ThreePointArc((-27.1376696088, 3.4405226523), (-27.4460456303, 1.5099044374), (-28.3404857607, -0.2285889665))
            ThreePointArc((-28.3404857607, -0.2285889665), (-24.3683081122, -5.4405828747), (-18.1206696088, -7.4179773477))
            Line((-18.1206696088, -7.4179773477), (-18.1206696088, -5.4494773477))
            Line((-18.1206696088, -5.4494773477), (-18.6286696088, -5.4494773477))
            Line((-18.6286696088, -5.4494773477), (-18.6286696088, -4.9414773477))
            Line((-18.6286696088, -4.9414773477), (-19.916720833, -3.6534261235))
            Line((-19.916720833, -3.6534261235), (-18.6286696088, -3.6534261235))
            Line((-18.6286696088, -3.6534261235), (-18.6286696088, 0.9005226523))
            Line((-18.6286696088, 0.9005226523), (-18.1206696088, 0.9005226523))
            Line((-18.1206696088, 0.9005226523), (-18.1206696088, 1.9673226523))
            ThreePointArc((-18.1206696088, 1.9673226523), (-19.1623793188, 2.3988129423), (-19.5938696088, 3.4405226523))
        make_face()
        with BuildLine():
            ThreePointArc((-28.3404857607, 7.1096342711), (-28.8183071035, 5.3026650427), (-28.9791696088, 3.4405226523))
            Line((-28.9791696088, 3.4405226523), (-27.1376696088, 3.4405226523))
            ThreePointArc((-27.1376696088, 3.4405226523), (-27.4460456303, 5.3711408672), (-28.3404857607, 7.1096342711))
        make_face()
        with BuildLine():
            Line((-27.1376696088, 3.4405226523), (-28.9791696088, 3.4405226523))
            ThreePointArc((-28.9791696088, 3.4405226523), (-28.8183071035, 1.5783802619), (-28.3404857607, -0.2285889665))
            ThreePointArc((-28.3404857607, -0.2285889665), (-27.4460456303, 1.5099044374), (-27.1376696088, 3.4405226523))
        make_face()
        with BuildLine():
            Line((-18.1206696088, -5.4494773477), (-18.1206696088, -7.4179773477))
            ThreePointArc((-18.1206696088, -7.4179773477), (-12.4811612862, -5.8386458519), (-8.4821471598, -1.5600680379))
            ThreePointArc((-8.4821471598, -1.5600680379), (-8.9382040993, 0.9217644253), (-9.0909696088, 3.4405226523))
            Line((-9.0909696088, 3.4405226523), (-16.6474696088, 3.4405226523))
            ThreePointArc((-16.6474696088, 3.4405226523), (-17.0789598988, 2.3988129423), (-18.1206696088, 1.9673226523))
            Line((-18.1206696088, 1.9673226523), (-18.1206696088, 0.9005226523))
            Line((-18.1206696088, 0.9005226523), (-17.6126696088, 0.9005226523))
            Line((-17.6126696088, 0.9005226523), (-17.6126696088, -3.6534261235))
            Line((-17.6126696088, -3.6534261235), (-16.3246183846, -3.6534261235))
            Line((-16.3246183846, -3.6534261235), (-17.6126696088, -4.9414773477))
            Line((-17.6126696088, -4.9414773477), (-17.6126696088, -5.4494773477))
            Line((-17.6126696088, -5.4494773477), (-18.1206696088, -5.4494773477))
        make_face()
        Polygon((-17.6126696088, -4.9414773477), (-18.1206696088, -5.4494773477), (-17.6126696088, -5.4494773477), align=None)
        Polygon((-18.6286696088, -5.4494773477), (-18.1206696088, -5.4494773477), (-18.6286696088, -4.9414773477), align=None)
    extrude(amount=F4_DEPTH)


with BuildPart() as f5:
    # F0 (on Top) → F5 (new body)
    with BuildSketch(Plane.XY.offset(F5_START)):
        with BuildLine():
            Line((11.7497303912, 3.4405226523), (10.2765303912, 3.4405226523))
            ThreePointArc((10.2765303912, 3.4405226523), (10.7080206812, 2.3988129423), (11.7497303912, 1.9673226523))
            Line((11.7497303912, 1.9673226523), (11.7497303912, 3.4405226523))
        make_face()
        with BuildLine():
            ThreePointArc((13.2229303912, 3.4405226523), (11.7497303912, 4.9137226523), (10.2765303912, 3.4405226523))
            Line((10.2765303912, 3.4405226523), (11.7497303912, 3.4405226523))
            Line((11.7497303912, 3.4405226523), (11.7497303912, 1.9673226523))
            ThreePointArc((11.7497303912, 1.9673226523), (12.7914401012, 2.3988129423), (13.2229303912, 3.4405226523))
        make_face()
    extrude(amount=-F5_DEPTH)


solid = Compound([f1.part, f2.part, f3.part, f4.part, f5.part])
